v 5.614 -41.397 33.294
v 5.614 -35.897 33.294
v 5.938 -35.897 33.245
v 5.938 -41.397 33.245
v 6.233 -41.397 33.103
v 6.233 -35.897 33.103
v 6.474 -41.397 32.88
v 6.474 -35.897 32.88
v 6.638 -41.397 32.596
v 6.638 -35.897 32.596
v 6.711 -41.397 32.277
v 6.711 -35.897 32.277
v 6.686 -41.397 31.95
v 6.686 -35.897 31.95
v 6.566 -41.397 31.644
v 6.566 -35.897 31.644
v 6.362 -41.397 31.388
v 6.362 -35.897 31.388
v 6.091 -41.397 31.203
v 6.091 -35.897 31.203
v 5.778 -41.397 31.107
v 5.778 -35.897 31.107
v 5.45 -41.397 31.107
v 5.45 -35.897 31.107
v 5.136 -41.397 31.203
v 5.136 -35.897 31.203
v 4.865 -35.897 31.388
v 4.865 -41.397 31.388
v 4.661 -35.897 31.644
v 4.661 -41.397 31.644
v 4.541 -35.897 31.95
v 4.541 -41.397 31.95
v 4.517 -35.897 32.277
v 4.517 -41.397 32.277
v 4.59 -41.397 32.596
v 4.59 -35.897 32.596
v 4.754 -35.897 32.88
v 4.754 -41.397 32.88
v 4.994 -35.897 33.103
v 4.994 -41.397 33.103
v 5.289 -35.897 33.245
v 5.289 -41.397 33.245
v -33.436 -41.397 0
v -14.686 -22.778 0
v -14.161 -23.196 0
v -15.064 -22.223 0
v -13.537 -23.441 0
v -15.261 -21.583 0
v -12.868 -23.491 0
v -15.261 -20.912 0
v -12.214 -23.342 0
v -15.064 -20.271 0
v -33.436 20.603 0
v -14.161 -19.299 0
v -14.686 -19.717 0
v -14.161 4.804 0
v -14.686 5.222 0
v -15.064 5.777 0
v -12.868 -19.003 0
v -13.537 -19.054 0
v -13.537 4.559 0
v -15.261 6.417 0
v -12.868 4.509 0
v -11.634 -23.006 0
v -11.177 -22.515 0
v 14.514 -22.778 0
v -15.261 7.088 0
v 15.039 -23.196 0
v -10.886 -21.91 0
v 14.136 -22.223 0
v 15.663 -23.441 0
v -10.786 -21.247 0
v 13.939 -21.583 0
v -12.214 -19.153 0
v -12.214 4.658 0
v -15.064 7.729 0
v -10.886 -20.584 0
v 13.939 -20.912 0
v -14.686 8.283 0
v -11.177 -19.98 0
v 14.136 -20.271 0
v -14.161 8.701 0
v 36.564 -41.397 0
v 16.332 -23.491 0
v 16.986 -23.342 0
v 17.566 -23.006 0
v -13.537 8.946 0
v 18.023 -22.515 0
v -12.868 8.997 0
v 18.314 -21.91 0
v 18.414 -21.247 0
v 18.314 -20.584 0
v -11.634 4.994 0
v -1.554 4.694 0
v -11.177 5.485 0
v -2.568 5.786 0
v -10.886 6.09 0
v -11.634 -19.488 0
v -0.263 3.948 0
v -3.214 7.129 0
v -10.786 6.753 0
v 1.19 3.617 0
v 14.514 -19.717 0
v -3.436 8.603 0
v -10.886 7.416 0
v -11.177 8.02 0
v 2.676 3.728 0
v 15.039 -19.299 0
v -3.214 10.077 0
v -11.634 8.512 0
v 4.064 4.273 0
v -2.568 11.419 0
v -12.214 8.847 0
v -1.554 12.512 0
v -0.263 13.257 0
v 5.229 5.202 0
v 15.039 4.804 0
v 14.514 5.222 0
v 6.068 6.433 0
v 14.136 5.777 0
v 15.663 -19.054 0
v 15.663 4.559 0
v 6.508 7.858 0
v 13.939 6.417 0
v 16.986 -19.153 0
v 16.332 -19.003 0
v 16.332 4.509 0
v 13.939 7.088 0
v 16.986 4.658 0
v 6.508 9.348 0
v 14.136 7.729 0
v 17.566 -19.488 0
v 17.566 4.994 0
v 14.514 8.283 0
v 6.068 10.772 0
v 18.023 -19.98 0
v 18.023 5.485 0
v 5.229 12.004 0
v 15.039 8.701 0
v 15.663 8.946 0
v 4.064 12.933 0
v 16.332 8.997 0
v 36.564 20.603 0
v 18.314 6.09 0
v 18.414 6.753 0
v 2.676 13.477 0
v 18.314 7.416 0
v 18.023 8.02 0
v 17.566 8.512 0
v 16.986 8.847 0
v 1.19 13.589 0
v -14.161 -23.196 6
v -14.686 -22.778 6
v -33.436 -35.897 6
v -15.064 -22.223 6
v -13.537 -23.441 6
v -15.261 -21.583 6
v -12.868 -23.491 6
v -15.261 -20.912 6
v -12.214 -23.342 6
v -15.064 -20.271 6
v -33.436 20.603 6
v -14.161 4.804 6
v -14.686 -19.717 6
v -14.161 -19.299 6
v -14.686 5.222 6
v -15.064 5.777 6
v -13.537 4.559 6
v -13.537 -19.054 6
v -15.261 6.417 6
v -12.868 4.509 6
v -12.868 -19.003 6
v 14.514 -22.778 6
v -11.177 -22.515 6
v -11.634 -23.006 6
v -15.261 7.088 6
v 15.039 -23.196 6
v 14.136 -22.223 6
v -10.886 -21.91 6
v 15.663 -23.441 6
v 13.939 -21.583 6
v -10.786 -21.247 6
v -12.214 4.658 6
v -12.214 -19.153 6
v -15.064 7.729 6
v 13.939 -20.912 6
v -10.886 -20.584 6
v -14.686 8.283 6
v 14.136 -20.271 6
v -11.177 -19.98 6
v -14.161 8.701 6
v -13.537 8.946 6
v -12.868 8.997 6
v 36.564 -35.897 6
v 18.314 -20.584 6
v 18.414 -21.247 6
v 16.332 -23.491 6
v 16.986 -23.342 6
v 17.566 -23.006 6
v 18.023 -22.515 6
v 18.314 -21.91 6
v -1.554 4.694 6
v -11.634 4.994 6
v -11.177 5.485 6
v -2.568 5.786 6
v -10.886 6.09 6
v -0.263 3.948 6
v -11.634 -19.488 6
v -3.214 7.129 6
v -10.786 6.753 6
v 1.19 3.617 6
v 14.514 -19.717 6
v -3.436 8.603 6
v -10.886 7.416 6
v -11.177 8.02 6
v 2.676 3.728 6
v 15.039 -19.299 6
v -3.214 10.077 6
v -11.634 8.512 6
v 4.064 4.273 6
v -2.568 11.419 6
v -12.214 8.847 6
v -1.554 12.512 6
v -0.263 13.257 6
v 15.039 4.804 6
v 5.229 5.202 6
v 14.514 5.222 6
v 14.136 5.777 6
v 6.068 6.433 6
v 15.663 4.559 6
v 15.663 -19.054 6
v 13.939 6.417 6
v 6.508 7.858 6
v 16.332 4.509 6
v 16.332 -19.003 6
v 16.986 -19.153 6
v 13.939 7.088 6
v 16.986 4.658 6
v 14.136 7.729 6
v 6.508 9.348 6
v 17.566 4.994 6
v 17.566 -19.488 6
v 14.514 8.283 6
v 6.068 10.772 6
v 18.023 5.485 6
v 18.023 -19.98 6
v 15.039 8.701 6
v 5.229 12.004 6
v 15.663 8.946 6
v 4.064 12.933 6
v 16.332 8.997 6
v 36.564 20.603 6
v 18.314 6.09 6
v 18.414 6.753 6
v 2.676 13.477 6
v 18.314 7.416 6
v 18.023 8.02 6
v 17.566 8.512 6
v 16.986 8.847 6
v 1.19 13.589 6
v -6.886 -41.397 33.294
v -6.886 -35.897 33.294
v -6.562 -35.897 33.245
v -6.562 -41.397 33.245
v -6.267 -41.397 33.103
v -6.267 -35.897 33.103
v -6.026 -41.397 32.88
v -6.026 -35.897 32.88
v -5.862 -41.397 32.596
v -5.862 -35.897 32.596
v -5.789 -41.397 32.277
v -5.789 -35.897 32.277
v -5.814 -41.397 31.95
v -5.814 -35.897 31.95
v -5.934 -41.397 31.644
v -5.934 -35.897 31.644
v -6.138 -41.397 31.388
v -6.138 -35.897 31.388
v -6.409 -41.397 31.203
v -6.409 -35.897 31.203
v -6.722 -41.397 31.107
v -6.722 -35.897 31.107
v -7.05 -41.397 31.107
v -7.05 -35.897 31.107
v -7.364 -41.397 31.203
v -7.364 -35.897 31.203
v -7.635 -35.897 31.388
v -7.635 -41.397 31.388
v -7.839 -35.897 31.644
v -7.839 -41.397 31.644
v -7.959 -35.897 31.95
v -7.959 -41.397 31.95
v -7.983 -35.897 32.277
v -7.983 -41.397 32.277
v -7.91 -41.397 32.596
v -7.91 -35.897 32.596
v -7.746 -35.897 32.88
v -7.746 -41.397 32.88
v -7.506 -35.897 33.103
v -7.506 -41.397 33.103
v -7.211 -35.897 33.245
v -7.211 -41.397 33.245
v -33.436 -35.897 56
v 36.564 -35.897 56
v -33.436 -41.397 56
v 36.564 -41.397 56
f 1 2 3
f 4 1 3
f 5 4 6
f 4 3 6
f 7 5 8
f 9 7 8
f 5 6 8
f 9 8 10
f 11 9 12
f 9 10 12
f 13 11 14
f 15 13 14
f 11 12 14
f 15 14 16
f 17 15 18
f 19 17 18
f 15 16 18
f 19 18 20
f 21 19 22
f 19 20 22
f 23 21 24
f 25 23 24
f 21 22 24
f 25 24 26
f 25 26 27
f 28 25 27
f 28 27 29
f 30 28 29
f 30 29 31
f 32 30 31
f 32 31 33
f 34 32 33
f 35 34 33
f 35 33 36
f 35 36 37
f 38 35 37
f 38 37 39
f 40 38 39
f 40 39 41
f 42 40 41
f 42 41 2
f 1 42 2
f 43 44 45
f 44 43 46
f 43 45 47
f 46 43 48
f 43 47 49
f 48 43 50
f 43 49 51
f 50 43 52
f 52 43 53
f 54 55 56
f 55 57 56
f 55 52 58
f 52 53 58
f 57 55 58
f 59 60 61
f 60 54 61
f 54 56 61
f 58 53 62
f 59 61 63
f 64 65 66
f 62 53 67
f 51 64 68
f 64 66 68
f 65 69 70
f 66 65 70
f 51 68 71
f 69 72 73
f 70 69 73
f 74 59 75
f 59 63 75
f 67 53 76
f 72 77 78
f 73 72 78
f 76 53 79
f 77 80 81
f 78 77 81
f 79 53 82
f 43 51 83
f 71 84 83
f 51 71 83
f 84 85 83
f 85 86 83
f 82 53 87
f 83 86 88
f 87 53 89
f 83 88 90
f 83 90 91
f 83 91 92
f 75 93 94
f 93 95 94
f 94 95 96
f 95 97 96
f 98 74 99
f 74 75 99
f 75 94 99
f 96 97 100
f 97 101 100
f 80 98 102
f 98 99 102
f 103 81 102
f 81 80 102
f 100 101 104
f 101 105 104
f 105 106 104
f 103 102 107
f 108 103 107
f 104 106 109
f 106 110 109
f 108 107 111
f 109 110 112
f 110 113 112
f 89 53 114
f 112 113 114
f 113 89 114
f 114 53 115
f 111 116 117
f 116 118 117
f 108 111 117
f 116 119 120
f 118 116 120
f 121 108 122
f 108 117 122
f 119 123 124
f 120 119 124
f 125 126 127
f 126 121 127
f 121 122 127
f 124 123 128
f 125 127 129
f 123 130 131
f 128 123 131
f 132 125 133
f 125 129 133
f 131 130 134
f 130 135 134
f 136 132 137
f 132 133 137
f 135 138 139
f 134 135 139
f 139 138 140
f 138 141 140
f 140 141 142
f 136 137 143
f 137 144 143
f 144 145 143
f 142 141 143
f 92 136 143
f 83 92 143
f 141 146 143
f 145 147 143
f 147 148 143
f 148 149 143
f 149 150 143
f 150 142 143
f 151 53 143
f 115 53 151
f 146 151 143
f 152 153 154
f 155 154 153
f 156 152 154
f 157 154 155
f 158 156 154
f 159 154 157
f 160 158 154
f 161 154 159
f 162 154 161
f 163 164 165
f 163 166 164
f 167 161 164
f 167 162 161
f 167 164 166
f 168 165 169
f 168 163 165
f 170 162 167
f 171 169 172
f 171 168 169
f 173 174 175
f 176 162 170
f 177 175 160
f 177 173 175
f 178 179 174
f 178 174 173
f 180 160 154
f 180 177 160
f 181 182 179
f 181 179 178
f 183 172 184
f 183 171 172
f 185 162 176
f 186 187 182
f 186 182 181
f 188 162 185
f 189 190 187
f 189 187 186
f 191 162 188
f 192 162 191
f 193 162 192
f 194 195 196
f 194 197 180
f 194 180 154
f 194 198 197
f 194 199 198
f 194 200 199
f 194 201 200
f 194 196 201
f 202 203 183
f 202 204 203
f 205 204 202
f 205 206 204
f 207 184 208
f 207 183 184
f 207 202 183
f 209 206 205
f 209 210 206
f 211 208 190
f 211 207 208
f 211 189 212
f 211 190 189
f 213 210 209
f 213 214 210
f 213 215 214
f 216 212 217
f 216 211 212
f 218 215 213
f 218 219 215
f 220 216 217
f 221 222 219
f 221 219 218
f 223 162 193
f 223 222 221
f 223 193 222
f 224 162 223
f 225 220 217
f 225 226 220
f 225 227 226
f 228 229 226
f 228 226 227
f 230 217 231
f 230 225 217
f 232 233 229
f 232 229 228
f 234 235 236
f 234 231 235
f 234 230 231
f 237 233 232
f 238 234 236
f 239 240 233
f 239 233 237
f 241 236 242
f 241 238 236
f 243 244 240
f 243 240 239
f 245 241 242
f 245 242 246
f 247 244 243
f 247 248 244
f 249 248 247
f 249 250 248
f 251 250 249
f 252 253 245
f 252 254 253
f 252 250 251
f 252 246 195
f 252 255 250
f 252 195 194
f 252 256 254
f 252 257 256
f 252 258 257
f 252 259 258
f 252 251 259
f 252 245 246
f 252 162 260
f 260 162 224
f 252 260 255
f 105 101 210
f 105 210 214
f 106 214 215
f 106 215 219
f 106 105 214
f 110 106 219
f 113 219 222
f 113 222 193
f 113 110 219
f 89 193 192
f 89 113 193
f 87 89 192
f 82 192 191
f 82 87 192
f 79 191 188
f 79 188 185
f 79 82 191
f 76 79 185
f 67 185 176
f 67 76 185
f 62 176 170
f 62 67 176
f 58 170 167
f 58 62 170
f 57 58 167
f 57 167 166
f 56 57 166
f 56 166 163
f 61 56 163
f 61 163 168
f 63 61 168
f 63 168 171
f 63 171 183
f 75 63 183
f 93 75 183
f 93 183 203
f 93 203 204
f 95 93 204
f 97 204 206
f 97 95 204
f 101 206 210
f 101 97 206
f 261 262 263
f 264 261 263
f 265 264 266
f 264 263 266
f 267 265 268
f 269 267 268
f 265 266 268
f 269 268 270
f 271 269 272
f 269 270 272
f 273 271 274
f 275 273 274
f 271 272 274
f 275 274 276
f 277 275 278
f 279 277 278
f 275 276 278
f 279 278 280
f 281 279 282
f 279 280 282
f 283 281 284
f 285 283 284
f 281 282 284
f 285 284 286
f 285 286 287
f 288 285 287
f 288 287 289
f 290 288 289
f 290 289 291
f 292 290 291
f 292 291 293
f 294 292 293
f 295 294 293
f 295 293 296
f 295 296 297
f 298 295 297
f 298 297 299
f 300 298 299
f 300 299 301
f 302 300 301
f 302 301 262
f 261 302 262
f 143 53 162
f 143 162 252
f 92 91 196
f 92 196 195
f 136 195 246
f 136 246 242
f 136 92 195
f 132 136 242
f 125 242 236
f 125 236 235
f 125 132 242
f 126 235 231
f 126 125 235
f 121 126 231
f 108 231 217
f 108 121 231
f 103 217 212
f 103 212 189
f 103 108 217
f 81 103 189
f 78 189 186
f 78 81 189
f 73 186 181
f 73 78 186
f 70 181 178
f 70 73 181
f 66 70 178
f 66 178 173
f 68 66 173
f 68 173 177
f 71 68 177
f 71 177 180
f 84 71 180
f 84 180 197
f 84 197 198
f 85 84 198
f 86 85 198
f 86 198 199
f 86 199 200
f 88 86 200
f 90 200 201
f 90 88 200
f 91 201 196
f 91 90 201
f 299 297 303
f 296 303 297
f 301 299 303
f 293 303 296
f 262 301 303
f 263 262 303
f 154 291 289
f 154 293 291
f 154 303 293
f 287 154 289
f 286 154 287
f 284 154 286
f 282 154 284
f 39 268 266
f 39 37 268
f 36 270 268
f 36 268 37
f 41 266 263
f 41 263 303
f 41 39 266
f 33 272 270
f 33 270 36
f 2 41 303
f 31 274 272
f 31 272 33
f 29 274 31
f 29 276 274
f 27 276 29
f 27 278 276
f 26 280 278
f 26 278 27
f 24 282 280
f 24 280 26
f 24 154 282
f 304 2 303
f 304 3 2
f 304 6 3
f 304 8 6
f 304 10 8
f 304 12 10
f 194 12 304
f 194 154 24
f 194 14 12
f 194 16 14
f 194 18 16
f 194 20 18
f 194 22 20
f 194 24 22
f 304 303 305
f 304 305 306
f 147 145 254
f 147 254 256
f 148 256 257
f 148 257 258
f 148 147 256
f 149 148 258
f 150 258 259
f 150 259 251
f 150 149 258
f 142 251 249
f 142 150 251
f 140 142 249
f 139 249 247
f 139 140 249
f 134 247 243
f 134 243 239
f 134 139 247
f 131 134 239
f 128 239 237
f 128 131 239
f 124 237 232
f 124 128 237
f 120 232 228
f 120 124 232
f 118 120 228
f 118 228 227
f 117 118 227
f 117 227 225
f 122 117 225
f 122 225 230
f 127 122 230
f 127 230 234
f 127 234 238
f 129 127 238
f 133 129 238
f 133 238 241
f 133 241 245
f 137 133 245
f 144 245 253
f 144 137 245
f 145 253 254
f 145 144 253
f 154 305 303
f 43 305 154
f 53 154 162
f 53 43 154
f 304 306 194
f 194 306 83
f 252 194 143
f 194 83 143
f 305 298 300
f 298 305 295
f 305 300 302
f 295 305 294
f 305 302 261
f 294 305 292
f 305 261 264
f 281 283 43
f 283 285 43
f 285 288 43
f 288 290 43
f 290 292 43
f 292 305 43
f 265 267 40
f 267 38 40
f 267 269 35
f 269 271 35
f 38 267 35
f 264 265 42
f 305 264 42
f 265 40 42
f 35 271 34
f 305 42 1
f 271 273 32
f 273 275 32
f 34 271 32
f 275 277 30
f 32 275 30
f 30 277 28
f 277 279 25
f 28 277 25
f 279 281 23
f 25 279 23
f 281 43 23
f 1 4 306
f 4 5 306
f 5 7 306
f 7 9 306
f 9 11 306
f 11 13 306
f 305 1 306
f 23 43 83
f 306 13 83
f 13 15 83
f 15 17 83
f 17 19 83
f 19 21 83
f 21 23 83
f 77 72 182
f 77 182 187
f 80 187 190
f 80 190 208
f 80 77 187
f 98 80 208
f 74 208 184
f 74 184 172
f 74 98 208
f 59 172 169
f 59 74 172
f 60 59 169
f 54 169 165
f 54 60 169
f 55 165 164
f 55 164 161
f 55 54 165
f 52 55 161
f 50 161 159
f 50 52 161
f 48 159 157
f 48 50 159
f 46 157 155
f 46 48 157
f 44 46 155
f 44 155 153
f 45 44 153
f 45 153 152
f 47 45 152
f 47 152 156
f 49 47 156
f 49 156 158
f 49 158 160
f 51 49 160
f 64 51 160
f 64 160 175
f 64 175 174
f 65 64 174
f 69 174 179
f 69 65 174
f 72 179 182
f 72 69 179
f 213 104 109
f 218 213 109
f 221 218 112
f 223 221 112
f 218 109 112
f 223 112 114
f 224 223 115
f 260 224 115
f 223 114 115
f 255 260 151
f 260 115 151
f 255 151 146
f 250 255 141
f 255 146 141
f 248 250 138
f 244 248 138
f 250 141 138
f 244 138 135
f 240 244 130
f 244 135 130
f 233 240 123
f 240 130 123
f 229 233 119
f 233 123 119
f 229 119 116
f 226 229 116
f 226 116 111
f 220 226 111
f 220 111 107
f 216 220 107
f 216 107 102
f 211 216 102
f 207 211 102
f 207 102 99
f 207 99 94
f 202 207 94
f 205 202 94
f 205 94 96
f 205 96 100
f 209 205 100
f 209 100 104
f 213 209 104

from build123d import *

# Parameters (mm, degrees)
ESQUISSE1_W             = 70
ESQUISSE1_H             = 62
ESQUISSE1_R             = 2.25
BOSS_EXTRU_3_DEPTH      = 6
ESQUISSE3_W             = 70
ESQUISSE3_H             = 5.5
BOSS_EXTRU_4_DEPTH      = 50
ESQUISSE4_R             = 1.1
ENL_V_MAT_EXTRU_1_DEPTH = 88.550819181
ESQUISSE5_R             = 5
ENL_V_MAT_EXTRU_2_DEPTH = 50


with BuildPart() as part:
    # Esquisse1 → Boss.-Extru.3 (new body)
    with BuildSketch(Plane.XY):
        with Locations((1.563587615, -10.397163121)):
            Rectangle(ESQUISSE1_W, ESQUISSE1_H)
        with Locations((-13.036412385, 6.752836879)):
            Circle(ESQUISSE1_R, mode=Mode.SUBTRACT)
        with Locations((16.163587615, 6.752836879)):
            Circle(ESQUISSE1_R, mode=Mode.SUBTRACT)
        with Locations((-13.036412385, -21.247163121)):
            Circle(ESQUISSE1_R, mode=Mode.SUBTRACT)
        with Locations((16.163587615, -21.247163121)):
            Circle(ESQUISSE1_R, mode=Mode.SUBTRACT)
    extrude(amount=BOSS_EXTRU_3_DEPTH)

    # Esquisse3 → Boss.-Extru.4 (add)
    with BuildSketch(Plane.XY.offset(6)):
        with Locations((1.563587615, -38.647163121)):
            Rectangle(ESQUISSE3_W, ESQUISSE3_H)
    extrude(amount=BOSS_EXTRU_4_DEPTH)

    # Esquisse4 → Enlèv. mat.-Extru.1 (cut, through all)
    with BuildSketch(Plane(origin=(0, -35.897163121, 0), x_dir=(1, 0, 0), z_dir=(0, 1, 0))):
        with Locations(Location((-6.886412385, -32.194360359, 0), (0, 0, 270))):
            Circle(ESQUISSE4_R)
        with Locations(Location((5.613587615, -32.194360359, 0), (0, 0, 270))):
            Circle(ESQUISSE4_R)
    extrude(amount=-ENL_V_MAT_EXTRU_1_DEPTH, mode=Mode.SUBTRACT)

    # Esquisse5 → Enlèv. mat.-Extru.2 (cut)
    with BuildSketch(Plane(origin=(0, 0, 0), x_dir=(-1, 0, 0), z_dir=(0, 0, -1))):
        with Locations((-1.563587615, 8.602836879)):
            Circle(ESQUISSE5_R)
    extrude(amount=-ENL_V_MAT_EXTRU_2_DEPTH, mode=Mode.SUBTRACT)


solid = part.part
